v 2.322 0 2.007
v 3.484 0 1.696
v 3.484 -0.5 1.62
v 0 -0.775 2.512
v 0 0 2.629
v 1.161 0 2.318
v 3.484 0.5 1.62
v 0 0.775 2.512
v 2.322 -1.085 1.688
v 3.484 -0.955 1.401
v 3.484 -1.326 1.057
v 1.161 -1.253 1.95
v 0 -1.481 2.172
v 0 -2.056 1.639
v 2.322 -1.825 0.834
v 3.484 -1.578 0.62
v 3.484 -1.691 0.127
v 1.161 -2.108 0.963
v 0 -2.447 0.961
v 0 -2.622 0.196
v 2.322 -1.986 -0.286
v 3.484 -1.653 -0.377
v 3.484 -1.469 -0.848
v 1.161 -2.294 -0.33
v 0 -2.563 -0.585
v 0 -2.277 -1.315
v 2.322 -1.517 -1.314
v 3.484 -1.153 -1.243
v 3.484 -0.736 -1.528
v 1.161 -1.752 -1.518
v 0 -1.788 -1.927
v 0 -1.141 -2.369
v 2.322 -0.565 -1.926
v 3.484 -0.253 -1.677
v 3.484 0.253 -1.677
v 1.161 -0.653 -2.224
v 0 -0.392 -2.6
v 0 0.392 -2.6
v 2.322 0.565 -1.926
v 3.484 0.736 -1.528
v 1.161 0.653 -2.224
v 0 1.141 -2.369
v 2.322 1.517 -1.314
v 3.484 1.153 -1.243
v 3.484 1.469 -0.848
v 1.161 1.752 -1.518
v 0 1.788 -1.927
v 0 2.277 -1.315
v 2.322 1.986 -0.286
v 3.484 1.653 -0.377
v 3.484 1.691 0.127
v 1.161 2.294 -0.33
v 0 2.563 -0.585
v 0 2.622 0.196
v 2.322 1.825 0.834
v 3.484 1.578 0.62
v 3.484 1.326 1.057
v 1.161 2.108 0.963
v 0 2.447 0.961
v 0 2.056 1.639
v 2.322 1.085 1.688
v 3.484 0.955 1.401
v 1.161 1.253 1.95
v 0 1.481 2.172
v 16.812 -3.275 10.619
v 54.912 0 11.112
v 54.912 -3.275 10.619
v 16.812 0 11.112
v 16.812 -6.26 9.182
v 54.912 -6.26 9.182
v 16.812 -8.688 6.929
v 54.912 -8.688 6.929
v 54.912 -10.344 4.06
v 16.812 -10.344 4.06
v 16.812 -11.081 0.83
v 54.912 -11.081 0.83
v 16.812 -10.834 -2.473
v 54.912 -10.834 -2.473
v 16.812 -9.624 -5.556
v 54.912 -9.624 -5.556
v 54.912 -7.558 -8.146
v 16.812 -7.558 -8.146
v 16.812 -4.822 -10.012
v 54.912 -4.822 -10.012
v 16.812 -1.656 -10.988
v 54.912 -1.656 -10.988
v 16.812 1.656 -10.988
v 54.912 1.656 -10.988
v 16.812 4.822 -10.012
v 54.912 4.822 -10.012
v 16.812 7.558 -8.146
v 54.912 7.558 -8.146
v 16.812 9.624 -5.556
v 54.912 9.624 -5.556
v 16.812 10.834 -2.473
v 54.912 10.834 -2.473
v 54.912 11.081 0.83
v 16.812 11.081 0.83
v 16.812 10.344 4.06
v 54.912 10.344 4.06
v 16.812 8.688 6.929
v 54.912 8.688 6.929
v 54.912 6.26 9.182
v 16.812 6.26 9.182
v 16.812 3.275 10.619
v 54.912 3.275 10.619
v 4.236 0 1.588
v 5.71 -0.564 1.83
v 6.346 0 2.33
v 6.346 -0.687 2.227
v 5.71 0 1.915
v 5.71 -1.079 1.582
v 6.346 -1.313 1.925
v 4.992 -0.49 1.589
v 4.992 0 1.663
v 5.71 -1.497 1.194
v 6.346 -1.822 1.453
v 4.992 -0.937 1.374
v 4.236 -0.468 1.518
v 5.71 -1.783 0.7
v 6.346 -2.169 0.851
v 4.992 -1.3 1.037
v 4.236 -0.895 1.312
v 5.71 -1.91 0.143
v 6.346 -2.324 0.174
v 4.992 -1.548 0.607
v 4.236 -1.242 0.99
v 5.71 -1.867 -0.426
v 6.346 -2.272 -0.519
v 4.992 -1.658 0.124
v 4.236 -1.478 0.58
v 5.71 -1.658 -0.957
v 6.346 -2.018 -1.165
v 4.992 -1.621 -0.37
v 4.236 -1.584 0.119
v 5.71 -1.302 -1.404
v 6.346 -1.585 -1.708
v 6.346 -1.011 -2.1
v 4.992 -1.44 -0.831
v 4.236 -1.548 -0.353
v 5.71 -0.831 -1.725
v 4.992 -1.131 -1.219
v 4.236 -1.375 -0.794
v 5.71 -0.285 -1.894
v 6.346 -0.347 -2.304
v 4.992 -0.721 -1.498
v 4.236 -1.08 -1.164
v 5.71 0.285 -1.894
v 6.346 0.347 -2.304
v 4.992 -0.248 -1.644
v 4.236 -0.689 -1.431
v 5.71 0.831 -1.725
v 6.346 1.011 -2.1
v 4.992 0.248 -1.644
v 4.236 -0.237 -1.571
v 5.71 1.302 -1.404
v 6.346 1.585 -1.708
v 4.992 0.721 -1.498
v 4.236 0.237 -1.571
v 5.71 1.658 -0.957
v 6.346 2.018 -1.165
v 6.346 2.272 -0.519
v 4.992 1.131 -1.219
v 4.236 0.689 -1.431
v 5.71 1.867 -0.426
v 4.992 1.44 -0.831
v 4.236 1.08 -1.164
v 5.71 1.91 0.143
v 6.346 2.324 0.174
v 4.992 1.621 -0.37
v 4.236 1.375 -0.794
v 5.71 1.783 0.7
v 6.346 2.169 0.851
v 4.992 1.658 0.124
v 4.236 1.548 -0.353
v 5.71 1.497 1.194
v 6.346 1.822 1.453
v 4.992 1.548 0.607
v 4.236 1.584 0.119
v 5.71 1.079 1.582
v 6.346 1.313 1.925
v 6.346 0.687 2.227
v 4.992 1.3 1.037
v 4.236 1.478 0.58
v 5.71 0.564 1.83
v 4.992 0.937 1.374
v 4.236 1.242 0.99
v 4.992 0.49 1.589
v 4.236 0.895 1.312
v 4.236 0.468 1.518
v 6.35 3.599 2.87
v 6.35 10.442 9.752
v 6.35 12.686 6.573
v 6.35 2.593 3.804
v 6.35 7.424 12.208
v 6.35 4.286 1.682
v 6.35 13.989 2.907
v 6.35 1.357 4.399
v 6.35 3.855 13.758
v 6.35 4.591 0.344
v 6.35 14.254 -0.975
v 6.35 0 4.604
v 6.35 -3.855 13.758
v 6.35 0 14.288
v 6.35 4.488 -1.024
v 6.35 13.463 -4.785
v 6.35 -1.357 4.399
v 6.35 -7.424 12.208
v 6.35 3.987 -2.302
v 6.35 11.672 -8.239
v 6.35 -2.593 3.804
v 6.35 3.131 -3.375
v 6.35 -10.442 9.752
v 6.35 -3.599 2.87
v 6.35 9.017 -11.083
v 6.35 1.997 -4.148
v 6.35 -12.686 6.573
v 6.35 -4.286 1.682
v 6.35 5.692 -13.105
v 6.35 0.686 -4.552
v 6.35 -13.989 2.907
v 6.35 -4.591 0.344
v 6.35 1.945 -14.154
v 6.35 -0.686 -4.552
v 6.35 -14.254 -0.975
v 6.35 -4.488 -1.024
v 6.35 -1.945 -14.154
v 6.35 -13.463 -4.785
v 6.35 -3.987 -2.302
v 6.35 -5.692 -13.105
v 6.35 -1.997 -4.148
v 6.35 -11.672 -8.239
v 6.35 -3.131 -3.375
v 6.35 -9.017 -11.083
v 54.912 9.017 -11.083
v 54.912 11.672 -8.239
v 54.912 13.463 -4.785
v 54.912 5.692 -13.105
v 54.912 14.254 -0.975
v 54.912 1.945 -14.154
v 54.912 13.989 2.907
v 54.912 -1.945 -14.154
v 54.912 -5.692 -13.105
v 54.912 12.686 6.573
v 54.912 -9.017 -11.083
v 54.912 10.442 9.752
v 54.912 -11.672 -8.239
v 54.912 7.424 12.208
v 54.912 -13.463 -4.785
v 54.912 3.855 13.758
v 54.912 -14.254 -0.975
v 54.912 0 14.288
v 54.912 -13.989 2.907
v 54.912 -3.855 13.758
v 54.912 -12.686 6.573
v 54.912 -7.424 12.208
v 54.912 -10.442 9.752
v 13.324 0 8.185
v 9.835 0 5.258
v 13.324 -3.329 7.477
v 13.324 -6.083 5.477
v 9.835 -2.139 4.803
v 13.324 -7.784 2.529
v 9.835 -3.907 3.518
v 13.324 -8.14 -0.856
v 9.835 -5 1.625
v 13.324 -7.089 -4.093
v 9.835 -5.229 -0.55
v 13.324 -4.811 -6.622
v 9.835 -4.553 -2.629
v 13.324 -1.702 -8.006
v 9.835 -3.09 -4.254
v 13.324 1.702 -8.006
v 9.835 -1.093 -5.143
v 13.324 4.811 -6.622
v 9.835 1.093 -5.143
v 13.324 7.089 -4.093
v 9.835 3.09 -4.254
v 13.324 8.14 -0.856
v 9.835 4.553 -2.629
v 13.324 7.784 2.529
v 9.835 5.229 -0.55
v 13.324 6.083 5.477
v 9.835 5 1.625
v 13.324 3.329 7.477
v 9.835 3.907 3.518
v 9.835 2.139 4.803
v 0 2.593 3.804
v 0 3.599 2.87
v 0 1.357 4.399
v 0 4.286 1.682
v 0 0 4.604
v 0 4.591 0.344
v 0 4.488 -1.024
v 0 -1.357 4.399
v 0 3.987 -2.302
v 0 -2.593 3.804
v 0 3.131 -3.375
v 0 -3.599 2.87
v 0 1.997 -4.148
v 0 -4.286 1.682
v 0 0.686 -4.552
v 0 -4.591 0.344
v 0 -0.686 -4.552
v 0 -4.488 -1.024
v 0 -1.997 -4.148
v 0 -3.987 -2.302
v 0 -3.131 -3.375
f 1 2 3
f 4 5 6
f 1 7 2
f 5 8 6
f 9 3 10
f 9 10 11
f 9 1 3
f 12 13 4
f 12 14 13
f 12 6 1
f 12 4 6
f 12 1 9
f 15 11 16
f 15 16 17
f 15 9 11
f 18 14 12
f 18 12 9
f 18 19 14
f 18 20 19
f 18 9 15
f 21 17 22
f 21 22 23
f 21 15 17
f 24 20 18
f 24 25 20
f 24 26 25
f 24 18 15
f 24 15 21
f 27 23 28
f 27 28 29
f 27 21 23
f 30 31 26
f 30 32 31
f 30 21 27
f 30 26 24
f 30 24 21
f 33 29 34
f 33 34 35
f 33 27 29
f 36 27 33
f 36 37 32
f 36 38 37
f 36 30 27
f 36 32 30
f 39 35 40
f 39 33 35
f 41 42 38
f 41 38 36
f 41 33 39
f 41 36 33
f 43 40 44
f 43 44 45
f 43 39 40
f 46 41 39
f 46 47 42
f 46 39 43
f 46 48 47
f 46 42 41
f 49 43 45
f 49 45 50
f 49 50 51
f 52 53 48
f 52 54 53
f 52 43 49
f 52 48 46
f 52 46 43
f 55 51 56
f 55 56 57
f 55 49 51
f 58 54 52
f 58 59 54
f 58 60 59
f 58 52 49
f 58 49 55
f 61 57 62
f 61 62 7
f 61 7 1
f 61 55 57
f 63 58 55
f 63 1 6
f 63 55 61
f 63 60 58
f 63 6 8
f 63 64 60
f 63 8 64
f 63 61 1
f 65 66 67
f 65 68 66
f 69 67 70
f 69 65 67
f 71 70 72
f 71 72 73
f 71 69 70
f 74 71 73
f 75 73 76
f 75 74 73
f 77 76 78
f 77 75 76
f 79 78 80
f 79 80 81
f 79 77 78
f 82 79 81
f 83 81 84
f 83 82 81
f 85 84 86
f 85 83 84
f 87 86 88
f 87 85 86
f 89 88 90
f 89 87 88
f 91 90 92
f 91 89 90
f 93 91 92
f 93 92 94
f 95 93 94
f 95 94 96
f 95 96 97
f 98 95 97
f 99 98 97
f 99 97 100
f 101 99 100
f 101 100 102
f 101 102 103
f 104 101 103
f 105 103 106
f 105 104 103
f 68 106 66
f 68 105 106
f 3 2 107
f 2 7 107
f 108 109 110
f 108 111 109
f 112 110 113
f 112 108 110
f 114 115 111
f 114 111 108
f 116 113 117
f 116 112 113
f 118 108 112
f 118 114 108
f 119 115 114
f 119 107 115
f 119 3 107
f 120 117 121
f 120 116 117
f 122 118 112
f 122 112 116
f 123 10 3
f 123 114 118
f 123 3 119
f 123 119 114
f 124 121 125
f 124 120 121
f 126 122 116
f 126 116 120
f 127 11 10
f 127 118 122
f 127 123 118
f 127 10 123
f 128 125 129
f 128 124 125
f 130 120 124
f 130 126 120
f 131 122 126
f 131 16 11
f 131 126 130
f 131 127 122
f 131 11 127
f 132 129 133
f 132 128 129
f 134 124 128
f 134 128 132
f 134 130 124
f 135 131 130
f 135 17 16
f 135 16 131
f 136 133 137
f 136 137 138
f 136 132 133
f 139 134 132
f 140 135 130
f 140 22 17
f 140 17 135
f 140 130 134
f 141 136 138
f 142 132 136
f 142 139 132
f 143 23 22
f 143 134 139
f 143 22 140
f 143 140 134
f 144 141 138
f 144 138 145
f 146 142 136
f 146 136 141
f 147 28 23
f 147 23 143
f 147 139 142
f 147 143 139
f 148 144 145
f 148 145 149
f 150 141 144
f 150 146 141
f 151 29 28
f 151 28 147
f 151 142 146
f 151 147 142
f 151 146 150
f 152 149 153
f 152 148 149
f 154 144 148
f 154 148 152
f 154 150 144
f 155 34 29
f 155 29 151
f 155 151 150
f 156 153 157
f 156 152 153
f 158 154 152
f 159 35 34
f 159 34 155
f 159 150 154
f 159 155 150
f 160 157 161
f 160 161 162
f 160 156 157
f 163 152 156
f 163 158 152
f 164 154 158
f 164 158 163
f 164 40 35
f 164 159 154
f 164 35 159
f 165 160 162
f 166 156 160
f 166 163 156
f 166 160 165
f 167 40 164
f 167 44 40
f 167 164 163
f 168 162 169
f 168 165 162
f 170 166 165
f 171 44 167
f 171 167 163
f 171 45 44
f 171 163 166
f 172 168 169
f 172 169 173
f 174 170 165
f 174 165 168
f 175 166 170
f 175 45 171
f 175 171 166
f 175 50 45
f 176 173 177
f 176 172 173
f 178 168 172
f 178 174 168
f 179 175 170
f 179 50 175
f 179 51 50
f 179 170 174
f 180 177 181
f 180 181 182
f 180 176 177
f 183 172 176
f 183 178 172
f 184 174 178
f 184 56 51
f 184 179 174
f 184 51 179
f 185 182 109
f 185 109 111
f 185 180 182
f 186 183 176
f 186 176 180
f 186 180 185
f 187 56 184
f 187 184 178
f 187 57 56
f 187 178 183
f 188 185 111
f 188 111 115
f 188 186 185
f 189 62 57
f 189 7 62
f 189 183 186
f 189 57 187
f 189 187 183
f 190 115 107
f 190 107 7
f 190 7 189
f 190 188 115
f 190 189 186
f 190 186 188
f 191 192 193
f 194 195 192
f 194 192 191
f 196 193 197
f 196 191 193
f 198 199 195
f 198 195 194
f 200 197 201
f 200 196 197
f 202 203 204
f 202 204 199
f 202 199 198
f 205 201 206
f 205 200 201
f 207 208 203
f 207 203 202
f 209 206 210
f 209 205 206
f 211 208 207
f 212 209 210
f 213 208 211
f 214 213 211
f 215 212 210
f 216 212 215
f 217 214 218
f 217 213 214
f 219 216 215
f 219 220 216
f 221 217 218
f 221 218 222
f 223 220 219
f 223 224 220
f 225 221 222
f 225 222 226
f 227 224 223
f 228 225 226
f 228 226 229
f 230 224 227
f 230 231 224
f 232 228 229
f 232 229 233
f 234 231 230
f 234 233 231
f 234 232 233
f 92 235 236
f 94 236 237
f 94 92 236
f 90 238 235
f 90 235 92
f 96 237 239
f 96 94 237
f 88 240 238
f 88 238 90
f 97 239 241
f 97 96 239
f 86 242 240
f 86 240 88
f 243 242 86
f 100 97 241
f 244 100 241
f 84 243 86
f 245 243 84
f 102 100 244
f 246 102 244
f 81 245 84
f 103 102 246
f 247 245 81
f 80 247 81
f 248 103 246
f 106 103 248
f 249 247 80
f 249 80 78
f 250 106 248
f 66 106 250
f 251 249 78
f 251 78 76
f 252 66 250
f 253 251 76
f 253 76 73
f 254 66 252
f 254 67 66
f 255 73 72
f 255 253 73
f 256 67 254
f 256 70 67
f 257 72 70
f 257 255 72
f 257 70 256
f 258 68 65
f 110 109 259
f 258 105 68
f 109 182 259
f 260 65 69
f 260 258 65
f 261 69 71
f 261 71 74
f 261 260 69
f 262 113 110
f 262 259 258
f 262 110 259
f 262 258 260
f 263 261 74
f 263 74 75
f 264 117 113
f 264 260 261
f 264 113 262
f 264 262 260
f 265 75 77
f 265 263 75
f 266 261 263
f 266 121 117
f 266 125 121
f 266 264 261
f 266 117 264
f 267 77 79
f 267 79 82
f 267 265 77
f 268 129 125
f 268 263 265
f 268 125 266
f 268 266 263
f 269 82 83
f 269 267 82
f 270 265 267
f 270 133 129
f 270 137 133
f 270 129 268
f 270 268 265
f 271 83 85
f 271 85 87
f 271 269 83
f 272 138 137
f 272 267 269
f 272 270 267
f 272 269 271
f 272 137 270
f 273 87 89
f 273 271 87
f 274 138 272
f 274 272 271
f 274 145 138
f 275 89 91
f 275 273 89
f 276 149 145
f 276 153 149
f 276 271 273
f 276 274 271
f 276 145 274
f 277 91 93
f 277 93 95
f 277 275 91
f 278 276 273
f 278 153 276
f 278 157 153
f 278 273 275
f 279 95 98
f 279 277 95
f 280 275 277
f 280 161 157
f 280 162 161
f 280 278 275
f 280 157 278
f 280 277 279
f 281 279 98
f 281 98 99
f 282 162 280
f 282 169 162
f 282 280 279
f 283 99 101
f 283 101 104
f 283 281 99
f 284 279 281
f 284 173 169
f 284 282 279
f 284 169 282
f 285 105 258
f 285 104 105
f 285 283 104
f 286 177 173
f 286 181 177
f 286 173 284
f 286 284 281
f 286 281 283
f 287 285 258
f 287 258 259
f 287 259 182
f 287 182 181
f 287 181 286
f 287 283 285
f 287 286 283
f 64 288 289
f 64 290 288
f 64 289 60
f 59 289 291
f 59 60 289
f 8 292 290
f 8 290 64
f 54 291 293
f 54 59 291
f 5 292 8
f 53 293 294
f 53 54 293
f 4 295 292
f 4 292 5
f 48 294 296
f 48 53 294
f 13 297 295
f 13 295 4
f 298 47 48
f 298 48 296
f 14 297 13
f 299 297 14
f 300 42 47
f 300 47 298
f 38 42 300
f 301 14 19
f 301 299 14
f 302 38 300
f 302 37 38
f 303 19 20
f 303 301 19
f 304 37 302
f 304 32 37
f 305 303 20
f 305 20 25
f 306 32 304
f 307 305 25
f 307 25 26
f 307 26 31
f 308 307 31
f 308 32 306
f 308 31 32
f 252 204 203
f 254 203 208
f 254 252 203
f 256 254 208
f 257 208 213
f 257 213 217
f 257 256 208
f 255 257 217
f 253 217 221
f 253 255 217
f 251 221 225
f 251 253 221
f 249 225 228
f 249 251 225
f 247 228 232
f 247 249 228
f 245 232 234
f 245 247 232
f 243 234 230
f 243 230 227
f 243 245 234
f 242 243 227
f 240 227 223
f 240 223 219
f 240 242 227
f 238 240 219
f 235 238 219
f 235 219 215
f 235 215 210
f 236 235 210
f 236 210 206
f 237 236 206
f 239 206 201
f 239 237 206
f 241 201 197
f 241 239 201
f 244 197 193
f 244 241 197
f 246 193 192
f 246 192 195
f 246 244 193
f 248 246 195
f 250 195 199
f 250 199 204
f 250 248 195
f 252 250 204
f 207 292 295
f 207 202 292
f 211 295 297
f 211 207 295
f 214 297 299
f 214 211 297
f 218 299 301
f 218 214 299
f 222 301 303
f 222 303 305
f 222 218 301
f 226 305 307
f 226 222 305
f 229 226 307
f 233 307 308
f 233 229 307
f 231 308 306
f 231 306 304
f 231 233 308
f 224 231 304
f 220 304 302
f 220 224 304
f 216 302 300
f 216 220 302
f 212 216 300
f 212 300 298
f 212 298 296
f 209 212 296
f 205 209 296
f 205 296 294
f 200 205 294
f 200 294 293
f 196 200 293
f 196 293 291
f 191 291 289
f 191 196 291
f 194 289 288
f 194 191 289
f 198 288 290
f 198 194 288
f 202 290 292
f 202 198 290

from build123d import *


with BuildPart() as part:
    # Sketch1 → Revolve1 (revolve)
    with BuildSketch(Plane.XY, mode=Mode.PRIVATE) as revolve1_sk:
        with BuildLine():
            Line((6.35, 14.2875), (54.912326353, 14.2875))
            Line((54.912326353, 14.2875), (54.912326353, 11.1125))
            Line((54.912326353, 11.1125), (16.812326353, 11.1125))
            Line((16.812326353, 11.1125), (6.346118551, 2.330308893))
            ThreePointArc((6.346118551, 2.330308893), (4.992463664, 1.662760177), (3.483517422, 1.695685502))
            Line((3.483517422, 1.695685502), (0, 2.629091182))
            Line((0, 2.629091182), (0, 4.60375))
            Line((0, 4.60375), (6.35, 4.60375))
            Line((6.35, 4.60375), (6.35, 14.2875))
        make_face()
    revolve(revolve1_sk.sketch.rotate(Axis((0, 0, 0), (1, 0, 0)), 90), axis=Axis((0, 0, 0), (1, 0, 0)))


solid = part.part
